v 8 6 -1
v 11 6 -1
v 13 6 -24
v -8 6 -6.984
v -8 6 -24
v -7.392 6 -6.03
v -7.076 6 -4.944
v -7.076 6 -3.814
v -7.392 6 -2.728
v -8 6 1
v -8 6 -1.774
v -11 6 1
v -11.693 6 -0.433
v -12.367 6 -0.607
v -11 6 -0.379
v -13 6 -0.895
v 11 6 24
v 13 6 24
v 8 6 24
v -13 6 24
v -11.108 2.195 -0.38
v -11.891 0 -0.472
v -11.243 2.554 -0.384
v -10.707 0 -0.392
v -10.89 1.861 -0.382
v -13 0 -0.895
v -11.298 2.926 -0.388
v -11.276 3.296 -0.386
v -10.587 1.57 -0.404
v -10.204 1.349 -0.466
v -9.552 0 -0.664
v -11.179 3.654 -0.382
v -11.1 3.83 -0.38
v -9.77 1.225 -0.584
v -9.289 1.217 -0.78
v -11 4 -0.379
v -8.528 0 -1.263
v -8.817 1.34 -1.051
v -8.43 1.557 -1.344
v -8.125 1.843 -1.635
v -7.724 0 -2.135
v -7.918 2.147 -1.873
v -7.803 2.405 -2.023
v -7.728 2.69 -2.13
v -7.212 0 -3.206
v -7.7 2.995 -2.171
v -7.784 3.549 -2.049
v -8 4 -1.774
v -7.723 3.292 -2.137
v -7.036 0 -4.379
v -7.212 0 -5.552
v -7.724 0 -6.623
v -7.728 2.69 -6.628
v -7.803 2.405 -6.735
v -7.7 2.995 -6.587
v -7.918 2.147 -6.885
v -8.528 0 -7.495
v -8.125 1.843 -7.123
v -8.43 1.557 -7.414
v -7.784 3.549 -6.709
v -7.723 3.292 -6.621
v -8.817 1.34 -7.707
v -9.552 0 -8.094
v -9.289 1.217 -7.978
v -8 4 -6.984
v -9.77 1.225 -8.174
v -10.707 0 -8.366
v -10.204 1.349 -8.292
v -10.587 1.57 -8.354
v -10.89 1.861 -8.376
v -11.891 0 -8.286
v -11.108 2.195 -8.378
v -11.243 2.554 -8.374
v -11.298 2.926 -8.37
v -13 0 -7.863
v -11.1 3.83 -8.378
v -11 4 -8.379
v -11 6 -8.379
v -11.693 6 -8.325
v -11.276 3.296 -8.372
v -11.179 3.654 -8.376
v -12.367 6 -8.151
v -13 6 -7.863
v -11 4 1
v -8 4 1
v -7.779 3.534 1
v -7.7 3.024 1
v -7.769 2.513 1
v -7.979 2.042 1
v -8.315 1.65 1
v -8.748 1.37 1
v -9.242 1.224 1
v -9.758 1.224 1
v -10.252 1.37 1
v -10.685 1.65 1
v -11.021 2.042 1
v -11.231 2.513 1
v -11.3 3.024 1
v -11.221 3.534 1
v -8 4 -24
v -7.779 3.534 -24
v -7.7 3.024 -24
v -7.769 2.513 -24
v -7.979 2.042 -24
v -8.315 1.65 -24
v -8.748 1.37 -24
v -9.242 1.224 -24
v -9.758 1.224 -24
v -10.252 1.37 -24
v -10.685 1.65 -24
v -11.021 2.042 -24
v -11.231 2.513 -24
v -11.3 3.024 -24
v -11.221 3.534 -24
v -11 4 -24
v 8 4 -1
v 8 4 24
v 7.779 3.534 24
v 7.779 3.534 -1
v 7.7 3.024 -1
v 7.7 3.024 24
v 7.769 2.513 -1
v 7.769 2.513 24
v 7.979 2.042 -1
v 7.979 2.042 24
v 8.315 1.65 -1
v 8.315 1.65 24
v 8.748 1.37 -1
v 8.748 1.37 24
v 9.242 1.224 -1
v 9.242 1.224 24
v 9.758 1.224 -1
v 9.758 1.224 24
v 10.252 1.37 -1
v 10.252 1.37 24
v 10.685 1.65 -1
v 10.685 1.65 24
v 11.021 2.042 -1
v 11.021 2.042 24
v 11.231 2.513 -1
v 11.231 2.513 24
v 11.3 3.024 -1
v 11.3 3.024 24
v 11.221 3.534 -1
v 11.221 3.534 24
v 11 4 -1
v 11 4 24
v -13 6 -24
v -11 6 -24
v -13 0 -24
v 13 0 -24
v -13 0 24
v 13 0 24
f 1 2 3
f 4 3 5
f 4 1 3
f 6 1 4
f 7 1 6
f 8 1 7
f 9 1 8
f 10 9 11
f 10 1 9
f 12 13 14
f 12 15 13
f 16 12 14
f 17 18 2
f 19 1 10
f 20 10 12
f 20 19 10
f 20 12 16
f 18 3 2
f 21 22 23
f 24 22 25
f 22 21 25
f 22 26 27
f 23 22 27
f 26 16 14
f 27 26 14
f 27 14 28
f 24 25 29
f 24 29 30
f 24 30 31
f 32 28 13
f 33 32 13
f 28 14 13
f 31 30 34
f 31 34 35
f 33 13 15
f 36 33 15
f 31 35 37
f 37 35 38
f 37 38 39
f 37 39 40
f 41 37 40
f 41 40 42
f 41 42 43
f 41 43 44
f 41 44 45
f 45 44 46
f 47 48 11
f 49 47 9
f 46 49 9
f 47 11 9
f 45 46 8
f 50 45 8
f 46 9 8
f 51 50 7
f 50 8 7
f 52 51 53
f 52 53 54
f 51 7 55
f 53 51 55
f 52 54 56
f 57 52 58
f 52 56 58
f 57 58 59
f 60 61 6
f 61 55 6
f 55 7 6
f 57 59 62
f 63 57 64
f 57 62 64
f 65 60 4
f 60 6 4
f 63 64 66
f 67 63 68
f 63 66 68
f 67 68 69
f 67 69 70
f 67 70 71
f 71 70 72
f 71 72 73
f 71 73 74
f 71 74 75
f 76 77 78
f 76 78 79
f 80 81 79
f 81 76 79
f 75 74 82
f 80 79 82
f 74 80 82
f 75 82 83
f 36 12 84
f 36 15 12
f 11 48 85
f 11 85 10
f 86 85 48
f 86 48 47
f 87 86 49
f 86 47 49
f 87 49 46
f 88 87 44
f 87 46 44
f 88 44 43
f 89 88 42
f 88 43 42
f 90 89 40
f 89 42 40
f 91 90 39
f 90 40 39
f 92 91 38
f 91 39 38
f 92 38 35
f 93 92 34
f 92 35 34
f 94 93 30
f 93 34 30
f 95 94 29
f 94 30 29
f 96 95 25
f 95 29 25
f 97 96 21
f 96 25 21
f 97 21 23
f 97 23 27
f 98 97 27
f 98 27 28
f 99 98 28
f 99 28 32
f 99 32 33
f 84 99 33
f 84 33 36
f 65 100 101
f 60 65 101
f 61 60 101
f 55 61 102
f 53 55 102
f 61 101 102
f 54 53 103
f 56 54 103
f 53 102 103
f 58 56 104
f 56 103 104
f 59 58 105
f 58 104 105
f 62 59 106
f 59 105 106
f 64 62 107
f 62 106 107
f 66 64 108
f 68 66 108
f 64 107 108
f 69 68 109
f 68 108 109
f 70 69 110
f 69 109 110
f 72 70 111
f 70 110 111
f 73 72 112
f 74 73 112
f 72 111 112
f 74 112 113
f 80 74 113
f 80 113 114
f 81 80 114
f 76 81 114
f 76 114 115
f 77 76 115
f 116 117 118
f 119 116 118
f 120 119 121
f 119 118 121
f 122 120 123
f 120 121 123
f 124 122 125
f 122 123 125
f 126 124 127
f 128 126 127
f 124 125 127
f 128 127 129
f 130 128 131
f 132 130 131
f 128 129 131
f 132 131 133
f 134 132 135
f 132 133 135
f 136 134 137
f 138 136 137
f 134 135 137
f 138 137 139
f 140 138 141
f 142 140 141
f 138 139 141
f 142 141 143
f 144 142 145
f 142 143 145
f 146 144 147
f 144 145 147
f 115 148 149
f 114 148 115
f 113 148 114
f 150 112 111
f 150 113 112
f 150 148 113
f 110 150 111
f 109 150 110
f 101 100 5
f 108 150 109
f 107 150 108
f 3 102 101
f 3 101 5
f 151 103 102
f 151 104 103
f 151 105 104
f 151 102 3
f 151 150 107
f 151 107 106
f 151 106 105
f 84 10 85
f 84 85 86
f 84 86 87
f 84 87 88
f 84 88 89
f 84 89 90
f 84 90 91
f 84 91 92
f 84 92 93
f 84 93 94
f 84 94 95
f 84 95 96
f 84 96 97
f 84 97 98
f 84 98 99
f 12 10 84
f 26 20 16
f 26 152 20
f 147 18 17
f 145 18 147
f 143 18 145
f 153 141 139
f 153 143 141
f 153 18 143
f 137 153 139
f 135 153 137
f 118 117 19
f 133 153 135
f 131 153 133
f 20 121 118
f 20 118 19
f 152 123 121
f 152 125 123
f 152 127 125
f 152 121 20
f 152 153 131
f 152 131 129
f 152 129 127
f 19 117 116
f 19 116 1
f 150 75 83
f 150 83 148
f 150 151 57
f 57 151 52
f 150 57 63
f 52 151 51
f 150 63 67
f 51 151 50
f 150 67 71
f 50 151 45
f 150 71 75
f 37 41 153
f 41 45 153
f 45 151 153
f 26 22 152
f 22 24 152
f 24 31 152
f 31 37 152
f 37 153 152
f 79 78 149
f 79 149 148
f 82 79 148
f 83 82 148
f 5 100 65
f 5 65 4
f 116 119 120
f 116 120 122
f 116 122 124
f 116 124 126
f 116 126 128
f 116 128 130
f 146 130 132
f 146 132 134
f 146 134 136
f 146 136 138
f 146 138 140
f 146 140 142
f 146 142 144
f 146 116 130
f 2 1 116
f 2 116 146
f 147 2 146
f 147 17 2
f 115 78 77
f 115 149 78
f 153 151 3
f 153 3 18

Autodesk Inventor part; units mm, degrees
ref_plane "YZ Plane" through (0, 0, 0) normal (1, 0, 0) x (0, 1, 0)
ref_plane "XZ Plane" through (0, 0, 0) normal (0, 1, 0) x (-1, 0, 0)
ref_plane "XY Plane" through (0, 0, 0) normal (0, 0, 1) x (1, 0, 0)
sketch "Эскиз1" plane through (0, 0, 0) normal (0, 1, 0) x (-1, 0, 0)
  line L0 (13, -24) -> (-13, -24)
  line L1 (-13, -24) -> (-13, 24)
  line L2 (-13, 24) -> (13, 24)
  line L3 (13, 24) -> (13, -24)
  line L4 (13, -24) -> (-13, 24) construction
  line L5 (-13, -24) -> (13, 24) construction
  point P0 (0, 0)
  dimension "d0" = 26
  dimension "d1" = 48
extrude "Выдавливание1" add sketch "Эскиз1" along normal blind 6
sketch "Эскиз3" plane through (-13, 0, 24) normal (0, 0, 1) x (1, 0, 0)
  arc A0 (24, 4) -> (21, 4) centre (22.5, 3.005) ccw construction
  line L0 (26, 0) -> (26, 6) projected
  line L1 (21, 6) -> (24, 6)
  line L2 (24, 6) -> (24, 4)
  line L3 (24, 4) -> (21, 4) construction
  line L4 (21, 4) -> (21, 6)
  line L5 (21, 6) -> (24, 4) construction
  line L6 (24, 6) -> (21, 4) construction
  arc A1 (21, 4) -> (24, 4) centre (22.5, 3.005) ccw
  point P0 (13, 0)
  point P1 (22.5, 5)
  point P2 (22.5, 5)
  point P3 (22.5, 5)
  point P4 (22.5, 6)
  dimension "d8" = 3.6
  dimension "d10" = 2
  dimension "d11" = 3
  dimension "d12" = 2
extrude "Выдавливание3" cut sketch "Эскиз3" against normal blind 25
pattern_circular "Круговой массив1" count 2 over 360 about axis through (0, -10, 0) along (0, 1, 0) of "Выдавливание3"
sketch "Эскиз2" plane through (0, 6, 0) normal (0, 1, 0) x (1, 0, 0)
  circle A0 centre (-11.0356, 4.379) radius 4
  line L0 (13, 24) -> (-13, 24) projected
  point P0 (0, 0)
  dimension "d4" = 8
extrude "Выдавливание2" cut sketch "Эскиз2" against normal blind 6
sketch "Эскиз5" plane through (0, 6, 0) normal (0, 1, 0) x (1, 0, 0)
  line L0 (-13, 24) -> (-13, -24) projected
  arc A0 (-8, 1.7742) -> (-8, 6.9839) centre (-11.0356, 4.379) ccw projected
  arc A1 (-13, -4.1856) -> (-13.7446, 1.436) centre (-16.743, -1.8213) ccw
  arc A2 (-13, -6.1738) -> (-7.1165, 3.5787) centre (-23.7825, 6.9821) ccw
  point P0 (0, 0)
  point P1 (-5.684, 5.1513)
  point P2 (-13, 0.5431)
properties part number "ЛЦМК.30000.10.00.01 Згт по одснование"
